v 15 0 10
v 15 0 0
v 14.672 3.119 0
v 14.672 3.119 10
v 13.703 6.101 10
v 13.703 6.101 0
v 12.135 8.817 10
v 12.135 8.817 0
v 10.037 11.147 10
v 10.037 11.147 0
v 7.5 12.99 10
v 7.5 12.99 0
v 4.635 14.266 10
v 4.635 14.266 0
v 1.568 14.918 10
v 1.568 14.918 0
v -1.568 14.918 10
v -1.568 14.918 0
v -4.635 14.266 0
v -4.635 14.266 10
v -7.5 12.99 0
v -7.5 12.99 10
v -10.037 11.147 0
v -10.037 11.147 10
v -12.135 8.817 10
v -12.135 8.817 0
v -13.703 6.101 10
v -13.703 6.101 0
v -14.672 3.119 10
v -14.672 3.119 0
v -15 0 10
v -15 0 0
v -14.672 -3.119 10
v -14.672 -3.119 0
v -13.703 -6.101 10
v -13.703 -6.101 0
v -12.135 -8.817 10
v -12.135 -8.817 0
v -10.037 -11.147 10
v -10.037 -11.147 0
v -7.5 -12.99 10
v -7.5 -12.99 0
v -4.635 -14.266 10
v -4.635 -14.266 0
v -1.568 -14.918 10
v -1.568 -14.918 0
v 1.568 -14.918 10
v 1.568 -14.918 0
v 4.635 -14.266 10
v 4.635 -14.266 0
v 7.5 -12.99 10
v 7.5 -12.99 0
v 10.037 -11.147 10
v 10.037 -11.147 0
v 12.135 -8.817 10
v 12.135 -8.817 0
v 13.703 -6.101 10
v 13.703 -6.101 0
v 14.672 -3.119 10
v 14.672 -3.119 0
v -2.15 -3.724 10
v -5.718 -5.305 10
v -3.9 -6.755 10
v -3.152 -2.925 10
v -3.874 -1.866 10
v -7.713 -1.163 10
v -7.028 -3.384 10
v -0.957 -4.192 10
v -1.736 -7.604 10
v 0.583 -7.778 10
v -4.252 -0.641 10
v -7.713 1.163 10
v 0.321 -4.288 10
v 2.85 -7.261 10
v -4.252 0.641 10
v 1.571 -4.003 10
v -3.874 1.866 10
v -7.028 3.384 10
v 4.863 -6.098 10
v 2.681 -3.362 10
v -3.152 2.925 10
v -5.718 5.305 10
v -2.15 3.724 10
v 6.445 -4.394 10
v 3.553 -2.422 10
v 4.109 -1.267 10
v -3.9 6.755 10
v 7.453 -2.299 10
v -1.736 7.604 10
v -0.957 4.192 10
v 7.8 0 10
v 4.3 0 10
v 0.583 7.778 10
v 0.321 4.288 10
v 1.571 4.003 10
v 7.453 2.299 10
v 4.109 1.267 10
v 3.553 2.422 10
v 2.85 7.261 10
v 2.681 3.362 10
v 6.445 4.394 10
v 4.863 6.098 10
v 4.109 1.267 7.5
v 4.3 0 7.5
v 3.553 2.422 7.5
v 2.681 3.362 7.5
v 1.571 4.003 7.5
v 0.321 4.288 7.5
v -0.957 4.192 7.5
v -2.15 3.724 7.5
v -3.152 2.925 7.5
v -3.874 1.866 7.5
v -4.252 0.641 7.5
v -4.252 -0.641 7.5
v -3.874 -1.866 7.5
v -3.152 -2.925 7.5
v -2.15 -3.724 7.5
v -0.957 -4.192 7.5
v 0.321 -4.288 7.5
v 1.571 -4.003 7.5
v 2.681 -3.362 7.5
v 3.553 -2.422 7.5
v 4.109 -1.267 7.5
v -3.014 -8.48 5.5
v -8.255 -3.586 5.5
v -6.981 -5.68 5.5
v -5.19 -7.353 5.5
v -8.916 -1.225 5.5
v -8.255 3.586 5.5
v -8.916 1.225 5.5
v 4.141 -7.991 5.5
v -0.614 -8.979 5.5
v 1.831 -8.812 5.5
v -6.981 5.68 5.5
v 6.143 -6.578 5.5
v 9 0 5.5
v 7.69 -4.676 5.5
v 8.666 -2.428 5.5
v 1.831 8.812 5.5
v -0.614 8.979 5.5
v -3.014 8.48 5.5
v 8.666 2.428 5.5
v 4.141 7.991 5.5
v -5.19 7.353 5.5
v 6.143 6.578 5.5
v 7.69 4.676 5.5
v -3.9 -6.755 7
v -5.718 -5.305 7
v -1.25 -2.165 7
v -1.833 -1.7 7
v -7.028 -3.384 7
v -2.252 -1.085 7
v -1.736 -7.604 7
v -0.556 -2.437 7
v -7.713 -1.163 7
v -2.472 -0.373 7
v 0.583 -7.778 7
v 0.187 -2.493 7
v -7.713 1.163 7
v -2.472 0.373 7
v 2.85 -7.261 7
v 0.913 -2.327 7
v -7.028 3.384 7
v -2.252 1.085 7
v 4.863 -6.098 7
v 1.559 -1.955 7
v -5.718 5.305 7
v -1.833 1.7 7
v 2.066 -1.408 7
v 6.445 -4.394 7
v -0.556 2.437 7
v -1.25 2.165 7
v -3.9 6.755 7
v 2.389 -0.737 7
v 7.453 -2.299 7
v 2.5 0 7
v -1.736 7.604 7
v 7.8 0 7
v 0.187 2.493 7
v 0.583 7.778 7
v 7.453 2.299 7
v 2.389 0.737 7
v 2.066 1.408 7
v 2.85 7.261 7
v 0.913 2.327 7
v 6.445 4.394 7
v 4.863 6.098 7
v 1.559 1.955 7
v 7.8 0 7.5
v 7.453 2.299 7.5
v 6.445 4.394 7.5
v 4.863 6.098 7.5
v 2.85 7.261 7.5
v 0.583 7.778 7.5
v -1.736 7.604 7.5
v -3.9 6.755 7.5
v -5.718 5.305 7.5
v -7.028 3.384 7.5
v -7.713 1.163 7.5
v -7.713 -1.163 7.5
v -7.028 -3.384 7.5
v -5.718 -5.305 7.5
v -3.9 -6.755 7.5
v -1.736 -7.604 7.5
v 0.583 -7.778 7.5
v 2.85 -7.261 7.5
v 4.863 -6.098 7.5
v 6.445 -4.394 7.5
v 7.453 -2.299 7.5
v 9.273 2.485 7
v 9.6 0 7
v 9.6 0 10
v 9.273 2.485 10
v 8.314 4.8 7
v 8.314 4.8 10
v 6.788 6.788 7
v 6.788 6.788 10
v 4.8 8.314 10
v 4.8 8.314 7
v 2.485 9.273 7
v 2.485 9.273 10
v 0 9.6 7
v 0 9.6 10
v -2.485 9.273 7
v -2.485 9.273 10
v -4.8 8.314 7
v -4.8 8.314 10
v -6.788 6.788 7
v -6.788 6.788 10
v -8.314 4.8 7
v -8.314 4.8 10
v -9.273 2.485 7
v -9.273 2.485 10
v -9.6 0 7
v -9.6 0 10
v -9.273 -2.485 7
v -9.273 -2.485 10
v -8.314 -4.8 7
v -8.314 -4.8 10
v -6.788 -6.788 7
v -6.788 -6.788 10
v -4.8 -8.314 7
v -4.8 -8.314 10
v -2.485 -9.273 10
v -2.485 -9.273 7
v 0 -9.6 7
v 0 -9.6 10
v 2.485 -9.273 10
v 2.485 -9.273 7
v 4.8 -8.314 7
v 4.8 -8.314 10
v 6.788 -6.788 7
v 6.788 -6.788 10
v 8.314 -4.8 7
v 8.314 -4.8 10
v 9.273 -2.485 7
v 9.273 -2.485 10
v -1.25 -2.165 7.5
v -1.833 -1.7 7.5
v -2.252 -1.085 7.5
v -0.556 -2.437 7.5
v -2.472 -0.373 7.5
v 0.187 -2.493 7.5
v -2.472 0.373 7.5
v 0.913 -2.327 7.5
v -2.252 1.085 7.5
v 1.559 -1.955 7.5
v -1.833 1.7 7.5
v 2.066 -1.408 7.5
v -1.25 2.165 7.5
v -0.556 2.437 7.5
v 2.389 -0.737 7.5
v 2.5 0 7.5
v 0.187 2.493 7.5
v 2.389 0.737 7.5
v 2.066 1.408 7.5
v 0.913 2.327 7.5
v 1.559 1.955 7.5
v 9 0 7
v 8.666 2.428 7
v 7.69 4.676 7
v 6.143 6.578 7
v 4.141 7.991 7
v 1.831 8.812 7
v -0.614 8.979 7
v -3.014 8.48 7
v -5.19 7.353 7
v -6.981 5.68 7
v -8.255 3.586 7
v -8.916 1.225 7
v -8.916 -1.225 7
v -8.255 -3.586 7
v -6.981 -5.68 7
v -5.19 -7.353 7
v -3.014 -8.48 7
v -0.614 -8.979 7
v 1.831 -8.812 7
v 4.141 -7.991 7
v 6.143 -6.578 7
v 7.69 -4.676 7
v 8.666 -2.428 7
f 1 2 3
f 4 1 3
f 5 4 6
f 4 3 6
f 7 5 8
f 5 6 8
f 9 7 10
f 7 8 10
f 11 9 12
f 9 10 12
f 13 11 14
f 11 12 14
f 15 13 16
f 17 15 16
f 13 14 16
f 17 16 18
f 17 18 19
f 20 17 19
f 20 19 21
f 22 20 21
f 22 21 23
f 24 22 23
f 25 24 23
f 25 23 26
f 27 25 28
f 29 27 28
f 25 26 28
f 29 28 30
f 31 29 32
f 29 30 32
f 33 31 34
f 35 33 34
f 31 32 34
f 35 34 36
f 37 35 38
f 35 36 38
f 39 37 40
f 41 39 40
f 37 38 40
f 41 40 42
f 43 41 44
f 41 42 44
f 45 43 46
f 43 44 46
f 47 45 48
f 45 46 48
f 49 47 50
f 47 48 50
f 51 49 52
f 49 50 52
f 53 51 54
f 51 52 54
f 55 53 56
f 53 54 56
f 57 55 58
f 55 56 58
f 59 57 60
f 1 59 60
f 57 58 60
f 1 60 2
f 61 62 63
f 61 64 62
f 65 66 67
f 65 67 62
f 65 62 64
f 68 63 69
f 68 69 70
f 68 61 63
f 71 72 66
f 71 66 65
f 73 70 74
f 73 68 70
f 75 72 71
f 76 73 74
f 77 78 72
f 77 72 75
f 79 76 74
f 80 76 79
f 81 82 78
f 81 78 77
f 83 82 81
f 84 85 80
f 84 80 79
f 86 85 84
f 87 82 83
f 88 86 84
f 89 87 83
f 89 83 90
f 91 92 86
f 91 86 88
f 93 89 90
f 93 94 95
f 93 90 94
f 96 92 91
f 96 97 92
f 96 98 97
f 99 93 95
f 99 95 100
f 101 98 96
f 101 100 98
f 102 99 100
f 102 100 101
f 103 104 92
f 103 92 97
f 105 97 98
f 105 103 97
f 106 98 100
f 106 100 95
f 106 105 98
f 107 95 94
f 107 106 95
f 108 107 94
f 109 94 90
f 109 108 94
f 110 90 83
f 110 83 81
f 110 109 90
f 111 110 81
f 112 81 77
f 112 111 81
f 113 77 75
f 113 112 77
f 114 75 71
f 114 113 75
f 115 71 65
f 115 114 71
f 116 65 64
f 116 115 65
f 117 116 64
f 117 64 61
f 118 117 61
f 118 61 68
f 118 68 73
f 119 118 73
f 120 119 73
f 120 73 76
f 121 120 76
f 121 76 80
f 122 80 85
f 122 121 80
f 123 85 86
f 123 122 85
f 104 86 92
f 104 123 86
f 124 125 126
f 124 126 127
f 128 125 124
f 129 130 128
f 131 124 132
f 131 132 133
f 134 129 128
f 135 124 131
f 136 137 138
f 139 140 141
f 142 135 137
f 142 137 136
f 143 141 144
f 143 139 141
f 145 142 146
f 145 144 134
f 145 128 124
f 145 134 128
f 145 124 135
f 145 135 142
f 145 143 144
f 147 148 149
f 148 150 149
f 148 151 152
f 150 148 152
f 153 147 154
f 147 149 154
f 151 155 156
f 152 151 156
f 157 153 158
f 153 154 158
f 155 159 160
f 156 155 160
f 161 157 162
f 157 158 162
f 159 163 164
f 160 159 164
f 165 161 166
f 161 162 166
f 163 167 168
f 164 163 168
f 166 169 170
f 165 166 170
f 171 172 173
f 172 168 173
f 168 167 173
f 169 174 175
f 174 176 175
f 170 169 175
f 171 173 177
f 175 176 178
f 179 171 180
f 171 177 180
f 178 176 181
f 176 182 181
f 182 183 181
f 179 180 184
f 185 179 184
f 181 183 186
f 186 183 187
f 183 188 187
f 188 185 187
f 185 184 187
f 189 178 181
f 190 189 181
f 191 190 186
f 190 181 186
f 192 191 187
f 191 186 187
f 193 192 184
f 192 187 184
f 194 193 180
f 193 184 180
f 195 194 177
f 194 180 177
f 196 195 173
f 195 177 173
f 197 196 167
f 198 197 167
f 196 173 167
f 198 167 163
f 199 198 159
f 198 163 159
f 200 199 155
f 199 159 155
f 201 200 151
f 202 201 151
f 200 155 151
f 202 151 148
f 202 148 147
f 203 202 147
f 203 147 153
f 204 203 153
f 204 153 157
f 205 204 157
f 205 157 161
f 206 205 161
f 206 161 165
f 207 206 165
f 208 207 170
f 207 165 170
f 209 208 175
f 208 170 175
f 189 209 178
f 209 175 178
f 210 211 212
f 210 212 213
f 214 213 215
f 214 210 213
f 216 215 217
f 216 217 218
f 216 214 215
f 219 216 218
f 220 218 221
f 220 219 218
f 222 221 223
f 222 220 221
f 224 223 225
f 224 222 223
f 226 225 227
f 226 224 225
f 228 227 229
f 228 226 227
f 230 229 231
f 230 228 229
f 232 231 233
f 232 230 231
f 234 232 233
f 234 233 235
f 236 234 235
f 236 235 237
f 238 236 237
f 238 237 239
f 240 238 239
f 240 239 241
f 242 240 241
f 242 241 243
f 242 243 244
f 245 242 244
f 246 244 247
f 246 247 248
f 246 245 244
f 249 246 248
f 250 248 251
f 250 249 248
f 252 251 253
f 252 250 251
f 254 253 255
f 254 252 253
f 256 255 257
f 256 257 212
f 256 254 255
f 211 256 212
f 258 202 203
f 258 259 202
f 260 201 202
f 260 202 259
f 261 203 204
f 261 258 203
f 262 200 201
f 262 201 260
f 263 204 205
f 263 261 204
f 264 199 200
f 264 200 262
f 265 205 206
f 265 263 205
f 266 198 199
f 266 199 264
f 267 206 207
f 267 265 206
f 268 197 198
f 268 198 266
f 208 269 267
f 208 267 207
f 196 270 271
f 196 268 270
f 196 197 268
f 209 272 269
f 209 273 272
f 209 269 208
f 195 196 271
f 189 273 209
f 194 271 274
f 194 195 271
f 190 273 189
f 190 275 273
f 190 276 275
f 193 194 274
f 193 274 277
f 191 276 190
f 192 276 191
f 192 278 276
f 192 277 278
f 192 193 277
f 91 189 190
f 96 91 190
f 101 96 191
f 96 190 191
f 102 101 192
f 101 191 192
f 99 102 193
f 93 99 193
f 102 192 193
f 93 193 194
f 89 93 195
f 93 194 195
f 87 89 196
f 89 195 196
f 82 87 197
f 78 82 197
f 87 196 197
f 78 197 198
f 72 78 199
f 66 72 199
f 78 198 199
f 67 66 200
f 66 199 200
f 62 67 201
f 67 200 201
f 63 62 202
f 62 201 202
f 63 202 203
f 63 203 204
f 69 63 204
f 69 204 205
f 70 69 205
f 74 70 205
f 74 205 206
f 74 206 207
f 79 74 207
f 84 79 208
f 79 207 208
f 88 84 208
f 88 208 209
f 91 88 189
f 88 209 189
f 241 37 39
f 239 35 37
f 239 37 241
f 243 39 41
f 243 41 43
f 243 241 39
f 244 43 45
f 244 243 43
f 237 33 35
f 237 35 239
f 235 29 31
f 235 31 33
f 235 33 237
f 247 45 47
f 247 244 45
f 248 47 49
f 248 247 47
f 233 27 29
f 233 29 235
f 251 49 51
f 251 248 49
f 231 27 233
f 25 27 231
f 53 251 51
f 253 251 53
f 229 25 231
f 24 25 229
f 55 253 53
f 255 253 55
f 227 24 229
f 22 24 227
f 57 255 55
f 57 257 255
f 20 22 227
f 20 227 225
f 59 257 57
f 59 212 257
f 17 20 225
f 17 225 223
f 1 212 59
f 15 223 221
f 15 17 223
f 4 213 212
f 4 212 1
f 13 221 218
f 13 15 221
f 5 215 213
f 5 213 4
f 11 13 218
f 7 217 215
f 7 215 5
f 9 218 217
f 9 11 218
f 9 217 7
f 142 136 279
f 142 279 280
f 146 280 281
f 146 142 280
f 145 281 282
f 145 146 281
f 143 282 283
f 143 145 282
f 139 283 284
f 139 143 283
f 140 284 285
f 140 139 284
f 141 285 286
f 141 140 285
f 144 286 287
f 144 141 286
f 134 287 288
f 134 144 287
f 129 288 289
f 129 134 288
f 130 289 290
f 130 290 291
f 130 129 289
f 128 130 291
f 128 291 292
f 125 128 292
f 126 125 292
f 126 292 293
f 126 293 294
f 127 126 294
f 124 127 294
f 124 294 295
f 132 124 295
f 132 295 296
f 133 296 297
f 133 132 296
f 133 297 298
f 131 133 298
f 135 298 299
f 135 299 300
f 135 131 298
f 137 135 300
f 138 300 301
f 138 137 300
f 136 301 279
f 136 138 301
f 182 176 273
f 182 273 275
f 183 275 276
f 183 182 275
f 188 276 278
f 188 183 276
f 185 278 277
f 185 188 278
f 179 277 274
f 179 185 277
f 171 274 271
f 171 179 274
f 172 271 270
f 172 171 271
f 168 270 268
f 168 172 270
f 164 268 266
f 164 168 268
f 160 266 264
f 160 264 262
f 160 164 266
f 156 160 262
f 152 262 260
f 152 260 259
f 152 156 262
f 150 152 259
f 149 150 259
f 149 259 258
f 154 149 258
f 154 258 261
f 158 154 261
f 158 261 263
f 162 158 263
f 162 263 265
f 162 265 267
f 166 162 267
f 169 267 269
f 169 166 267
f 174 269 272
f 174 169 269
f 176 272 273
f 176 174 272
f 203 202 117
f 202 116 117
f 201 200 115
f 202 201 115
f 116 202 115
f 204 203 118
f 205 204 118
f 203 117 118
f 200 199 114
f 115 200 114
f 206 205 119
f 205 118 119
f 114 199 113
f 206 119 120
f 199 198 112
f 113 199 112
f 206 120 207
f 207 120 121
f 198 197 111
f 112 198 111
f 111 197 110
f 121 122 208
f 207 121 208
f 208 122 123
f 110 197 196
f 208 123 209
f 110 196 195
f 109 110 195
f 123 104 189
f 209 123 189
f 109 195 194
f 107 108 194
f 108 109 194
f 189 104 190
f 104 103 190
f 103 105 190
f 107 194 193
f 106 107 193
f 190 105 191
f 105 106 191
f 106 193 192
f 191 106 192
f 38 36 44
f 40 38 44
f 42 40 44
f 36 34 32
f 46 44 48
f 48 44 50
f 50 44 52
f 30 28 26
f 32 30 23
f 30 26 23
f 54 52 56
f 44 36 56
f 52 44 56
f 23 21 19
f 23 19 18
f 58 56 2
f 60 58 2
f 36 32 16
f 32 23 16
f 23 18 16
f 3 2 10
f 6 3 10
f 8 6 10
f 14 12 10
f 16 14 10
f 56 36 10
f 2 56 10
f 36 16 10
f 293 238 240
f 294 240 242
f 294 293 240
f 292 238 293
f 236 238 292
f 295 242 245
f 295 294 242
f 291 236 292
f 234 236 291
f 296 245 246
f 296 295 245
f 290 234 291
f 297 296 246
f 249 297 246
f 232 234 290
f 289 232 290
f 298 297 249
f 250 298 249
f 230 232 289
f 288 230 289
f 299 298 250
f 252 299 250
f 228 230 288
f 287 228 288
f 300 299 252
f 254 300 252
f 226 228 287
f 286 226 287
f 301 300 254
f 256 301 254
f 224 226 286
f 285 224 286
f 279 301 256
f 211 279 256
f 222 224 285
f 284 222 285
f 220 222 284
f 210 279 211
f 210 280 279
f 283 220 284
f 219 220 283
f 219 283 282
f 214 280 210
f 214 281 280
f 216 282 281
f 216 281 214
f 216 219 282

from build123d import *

# Parameters (mm, degrees)
CYLINDER002_R     = 9
CYLINDER002_DEPTH = 1.5
CYLINDER001_R     = 9.6
CYLINDER001_DEPTH = 3
CYLINDER_R        = 15
CYLINDER_DEPTH    = 10
CYLINDER004_R     = 4.3
CYLINDER004_DEPTH = 2.5
CYLINDER003_R     = 7.8
CYLINDER003_DEPTH = 2.5
CYLINDER006_R     = 2.5
CYLINDER006_DEPTH = 0.5
CYLINDER005_R     = 7.8
CYLINDER005_DEPTH = 0.5


with BuildPart() as cylinder002:
    # Cylinder002 → Cylinder002 (new body)
    with BuildSketch(Plane.XY.offset(5.5)):
        Circle(CYLINDER002_R)
    extrude(amount=CYLINDER002_DEPTH)


with BuildPart() as cylinder001:
    # Cylinder001 → Cylinder001 (new body)
    with BuildSketch(Plane.XY.offset(7)):
        Circle(CYLINDER001_R)
    extrude(amount=CYLINDER001_DEPTH)


with BuildPart() as pad:
    # Cylinder → Cylinder (new body)
    with BuildSketch(Plane.XY):
        Circle(CYLINDER_R)
    extrude(amount=CYLINDER_DEPTH)

    # Cut: cut Cylinder001
    add(cylinder001.part, mode=Mode.SUBTRACT)

    # Cut001: cut Cylinder002
    add(cylinder002.part, mode=Mode.SUBTRACT)


with BuildPart() as cylinder004:
    # Cylinder004 → Cylinder004 (new body)
    with BuildSketch(Plane.XY.offset(7.5)):
        Circle(CYLINDER004_R)
    extrude(amount=CYLINDER004_DEPTH)


with BuildPart() as shaiba:
    # Cylinder003 → Cylinder003 (new body)
    with BuildSketch(Plane.XY.offset(7.5)):
        Circle(CYLINDER003_R)
    extrude(amount=CYLINDER003_DEPTH)

    # Cut002: cut Cylinder004
    add(cylinder004.part, mode=Mode.SUBTRACT)


with BuildPart() as cylinder006:
    # Cylinder006 → Cylinder006 (new body)
    with BuildSketch(Plane.XY.offset(7)):
        Circle(CYLINDER006_R)
    extrude(amount=CYLINDER006_DEPTH)


with BuildPart() as prokladka:
    # Cylinder005 → Cylinder005 (new body)
    with BuildSketch(Plane.XY.offset(7)):
        Circle(CYLINDER005_R)
    extrude(amount=CYLINDER005_DEPTH)

    # Cut003: cut Cylinder006
    add(cylinder006.part, mode=Mode.SUBTRACT)


solid = Compound([pad.part, shaiba.part, prokladka.part])
